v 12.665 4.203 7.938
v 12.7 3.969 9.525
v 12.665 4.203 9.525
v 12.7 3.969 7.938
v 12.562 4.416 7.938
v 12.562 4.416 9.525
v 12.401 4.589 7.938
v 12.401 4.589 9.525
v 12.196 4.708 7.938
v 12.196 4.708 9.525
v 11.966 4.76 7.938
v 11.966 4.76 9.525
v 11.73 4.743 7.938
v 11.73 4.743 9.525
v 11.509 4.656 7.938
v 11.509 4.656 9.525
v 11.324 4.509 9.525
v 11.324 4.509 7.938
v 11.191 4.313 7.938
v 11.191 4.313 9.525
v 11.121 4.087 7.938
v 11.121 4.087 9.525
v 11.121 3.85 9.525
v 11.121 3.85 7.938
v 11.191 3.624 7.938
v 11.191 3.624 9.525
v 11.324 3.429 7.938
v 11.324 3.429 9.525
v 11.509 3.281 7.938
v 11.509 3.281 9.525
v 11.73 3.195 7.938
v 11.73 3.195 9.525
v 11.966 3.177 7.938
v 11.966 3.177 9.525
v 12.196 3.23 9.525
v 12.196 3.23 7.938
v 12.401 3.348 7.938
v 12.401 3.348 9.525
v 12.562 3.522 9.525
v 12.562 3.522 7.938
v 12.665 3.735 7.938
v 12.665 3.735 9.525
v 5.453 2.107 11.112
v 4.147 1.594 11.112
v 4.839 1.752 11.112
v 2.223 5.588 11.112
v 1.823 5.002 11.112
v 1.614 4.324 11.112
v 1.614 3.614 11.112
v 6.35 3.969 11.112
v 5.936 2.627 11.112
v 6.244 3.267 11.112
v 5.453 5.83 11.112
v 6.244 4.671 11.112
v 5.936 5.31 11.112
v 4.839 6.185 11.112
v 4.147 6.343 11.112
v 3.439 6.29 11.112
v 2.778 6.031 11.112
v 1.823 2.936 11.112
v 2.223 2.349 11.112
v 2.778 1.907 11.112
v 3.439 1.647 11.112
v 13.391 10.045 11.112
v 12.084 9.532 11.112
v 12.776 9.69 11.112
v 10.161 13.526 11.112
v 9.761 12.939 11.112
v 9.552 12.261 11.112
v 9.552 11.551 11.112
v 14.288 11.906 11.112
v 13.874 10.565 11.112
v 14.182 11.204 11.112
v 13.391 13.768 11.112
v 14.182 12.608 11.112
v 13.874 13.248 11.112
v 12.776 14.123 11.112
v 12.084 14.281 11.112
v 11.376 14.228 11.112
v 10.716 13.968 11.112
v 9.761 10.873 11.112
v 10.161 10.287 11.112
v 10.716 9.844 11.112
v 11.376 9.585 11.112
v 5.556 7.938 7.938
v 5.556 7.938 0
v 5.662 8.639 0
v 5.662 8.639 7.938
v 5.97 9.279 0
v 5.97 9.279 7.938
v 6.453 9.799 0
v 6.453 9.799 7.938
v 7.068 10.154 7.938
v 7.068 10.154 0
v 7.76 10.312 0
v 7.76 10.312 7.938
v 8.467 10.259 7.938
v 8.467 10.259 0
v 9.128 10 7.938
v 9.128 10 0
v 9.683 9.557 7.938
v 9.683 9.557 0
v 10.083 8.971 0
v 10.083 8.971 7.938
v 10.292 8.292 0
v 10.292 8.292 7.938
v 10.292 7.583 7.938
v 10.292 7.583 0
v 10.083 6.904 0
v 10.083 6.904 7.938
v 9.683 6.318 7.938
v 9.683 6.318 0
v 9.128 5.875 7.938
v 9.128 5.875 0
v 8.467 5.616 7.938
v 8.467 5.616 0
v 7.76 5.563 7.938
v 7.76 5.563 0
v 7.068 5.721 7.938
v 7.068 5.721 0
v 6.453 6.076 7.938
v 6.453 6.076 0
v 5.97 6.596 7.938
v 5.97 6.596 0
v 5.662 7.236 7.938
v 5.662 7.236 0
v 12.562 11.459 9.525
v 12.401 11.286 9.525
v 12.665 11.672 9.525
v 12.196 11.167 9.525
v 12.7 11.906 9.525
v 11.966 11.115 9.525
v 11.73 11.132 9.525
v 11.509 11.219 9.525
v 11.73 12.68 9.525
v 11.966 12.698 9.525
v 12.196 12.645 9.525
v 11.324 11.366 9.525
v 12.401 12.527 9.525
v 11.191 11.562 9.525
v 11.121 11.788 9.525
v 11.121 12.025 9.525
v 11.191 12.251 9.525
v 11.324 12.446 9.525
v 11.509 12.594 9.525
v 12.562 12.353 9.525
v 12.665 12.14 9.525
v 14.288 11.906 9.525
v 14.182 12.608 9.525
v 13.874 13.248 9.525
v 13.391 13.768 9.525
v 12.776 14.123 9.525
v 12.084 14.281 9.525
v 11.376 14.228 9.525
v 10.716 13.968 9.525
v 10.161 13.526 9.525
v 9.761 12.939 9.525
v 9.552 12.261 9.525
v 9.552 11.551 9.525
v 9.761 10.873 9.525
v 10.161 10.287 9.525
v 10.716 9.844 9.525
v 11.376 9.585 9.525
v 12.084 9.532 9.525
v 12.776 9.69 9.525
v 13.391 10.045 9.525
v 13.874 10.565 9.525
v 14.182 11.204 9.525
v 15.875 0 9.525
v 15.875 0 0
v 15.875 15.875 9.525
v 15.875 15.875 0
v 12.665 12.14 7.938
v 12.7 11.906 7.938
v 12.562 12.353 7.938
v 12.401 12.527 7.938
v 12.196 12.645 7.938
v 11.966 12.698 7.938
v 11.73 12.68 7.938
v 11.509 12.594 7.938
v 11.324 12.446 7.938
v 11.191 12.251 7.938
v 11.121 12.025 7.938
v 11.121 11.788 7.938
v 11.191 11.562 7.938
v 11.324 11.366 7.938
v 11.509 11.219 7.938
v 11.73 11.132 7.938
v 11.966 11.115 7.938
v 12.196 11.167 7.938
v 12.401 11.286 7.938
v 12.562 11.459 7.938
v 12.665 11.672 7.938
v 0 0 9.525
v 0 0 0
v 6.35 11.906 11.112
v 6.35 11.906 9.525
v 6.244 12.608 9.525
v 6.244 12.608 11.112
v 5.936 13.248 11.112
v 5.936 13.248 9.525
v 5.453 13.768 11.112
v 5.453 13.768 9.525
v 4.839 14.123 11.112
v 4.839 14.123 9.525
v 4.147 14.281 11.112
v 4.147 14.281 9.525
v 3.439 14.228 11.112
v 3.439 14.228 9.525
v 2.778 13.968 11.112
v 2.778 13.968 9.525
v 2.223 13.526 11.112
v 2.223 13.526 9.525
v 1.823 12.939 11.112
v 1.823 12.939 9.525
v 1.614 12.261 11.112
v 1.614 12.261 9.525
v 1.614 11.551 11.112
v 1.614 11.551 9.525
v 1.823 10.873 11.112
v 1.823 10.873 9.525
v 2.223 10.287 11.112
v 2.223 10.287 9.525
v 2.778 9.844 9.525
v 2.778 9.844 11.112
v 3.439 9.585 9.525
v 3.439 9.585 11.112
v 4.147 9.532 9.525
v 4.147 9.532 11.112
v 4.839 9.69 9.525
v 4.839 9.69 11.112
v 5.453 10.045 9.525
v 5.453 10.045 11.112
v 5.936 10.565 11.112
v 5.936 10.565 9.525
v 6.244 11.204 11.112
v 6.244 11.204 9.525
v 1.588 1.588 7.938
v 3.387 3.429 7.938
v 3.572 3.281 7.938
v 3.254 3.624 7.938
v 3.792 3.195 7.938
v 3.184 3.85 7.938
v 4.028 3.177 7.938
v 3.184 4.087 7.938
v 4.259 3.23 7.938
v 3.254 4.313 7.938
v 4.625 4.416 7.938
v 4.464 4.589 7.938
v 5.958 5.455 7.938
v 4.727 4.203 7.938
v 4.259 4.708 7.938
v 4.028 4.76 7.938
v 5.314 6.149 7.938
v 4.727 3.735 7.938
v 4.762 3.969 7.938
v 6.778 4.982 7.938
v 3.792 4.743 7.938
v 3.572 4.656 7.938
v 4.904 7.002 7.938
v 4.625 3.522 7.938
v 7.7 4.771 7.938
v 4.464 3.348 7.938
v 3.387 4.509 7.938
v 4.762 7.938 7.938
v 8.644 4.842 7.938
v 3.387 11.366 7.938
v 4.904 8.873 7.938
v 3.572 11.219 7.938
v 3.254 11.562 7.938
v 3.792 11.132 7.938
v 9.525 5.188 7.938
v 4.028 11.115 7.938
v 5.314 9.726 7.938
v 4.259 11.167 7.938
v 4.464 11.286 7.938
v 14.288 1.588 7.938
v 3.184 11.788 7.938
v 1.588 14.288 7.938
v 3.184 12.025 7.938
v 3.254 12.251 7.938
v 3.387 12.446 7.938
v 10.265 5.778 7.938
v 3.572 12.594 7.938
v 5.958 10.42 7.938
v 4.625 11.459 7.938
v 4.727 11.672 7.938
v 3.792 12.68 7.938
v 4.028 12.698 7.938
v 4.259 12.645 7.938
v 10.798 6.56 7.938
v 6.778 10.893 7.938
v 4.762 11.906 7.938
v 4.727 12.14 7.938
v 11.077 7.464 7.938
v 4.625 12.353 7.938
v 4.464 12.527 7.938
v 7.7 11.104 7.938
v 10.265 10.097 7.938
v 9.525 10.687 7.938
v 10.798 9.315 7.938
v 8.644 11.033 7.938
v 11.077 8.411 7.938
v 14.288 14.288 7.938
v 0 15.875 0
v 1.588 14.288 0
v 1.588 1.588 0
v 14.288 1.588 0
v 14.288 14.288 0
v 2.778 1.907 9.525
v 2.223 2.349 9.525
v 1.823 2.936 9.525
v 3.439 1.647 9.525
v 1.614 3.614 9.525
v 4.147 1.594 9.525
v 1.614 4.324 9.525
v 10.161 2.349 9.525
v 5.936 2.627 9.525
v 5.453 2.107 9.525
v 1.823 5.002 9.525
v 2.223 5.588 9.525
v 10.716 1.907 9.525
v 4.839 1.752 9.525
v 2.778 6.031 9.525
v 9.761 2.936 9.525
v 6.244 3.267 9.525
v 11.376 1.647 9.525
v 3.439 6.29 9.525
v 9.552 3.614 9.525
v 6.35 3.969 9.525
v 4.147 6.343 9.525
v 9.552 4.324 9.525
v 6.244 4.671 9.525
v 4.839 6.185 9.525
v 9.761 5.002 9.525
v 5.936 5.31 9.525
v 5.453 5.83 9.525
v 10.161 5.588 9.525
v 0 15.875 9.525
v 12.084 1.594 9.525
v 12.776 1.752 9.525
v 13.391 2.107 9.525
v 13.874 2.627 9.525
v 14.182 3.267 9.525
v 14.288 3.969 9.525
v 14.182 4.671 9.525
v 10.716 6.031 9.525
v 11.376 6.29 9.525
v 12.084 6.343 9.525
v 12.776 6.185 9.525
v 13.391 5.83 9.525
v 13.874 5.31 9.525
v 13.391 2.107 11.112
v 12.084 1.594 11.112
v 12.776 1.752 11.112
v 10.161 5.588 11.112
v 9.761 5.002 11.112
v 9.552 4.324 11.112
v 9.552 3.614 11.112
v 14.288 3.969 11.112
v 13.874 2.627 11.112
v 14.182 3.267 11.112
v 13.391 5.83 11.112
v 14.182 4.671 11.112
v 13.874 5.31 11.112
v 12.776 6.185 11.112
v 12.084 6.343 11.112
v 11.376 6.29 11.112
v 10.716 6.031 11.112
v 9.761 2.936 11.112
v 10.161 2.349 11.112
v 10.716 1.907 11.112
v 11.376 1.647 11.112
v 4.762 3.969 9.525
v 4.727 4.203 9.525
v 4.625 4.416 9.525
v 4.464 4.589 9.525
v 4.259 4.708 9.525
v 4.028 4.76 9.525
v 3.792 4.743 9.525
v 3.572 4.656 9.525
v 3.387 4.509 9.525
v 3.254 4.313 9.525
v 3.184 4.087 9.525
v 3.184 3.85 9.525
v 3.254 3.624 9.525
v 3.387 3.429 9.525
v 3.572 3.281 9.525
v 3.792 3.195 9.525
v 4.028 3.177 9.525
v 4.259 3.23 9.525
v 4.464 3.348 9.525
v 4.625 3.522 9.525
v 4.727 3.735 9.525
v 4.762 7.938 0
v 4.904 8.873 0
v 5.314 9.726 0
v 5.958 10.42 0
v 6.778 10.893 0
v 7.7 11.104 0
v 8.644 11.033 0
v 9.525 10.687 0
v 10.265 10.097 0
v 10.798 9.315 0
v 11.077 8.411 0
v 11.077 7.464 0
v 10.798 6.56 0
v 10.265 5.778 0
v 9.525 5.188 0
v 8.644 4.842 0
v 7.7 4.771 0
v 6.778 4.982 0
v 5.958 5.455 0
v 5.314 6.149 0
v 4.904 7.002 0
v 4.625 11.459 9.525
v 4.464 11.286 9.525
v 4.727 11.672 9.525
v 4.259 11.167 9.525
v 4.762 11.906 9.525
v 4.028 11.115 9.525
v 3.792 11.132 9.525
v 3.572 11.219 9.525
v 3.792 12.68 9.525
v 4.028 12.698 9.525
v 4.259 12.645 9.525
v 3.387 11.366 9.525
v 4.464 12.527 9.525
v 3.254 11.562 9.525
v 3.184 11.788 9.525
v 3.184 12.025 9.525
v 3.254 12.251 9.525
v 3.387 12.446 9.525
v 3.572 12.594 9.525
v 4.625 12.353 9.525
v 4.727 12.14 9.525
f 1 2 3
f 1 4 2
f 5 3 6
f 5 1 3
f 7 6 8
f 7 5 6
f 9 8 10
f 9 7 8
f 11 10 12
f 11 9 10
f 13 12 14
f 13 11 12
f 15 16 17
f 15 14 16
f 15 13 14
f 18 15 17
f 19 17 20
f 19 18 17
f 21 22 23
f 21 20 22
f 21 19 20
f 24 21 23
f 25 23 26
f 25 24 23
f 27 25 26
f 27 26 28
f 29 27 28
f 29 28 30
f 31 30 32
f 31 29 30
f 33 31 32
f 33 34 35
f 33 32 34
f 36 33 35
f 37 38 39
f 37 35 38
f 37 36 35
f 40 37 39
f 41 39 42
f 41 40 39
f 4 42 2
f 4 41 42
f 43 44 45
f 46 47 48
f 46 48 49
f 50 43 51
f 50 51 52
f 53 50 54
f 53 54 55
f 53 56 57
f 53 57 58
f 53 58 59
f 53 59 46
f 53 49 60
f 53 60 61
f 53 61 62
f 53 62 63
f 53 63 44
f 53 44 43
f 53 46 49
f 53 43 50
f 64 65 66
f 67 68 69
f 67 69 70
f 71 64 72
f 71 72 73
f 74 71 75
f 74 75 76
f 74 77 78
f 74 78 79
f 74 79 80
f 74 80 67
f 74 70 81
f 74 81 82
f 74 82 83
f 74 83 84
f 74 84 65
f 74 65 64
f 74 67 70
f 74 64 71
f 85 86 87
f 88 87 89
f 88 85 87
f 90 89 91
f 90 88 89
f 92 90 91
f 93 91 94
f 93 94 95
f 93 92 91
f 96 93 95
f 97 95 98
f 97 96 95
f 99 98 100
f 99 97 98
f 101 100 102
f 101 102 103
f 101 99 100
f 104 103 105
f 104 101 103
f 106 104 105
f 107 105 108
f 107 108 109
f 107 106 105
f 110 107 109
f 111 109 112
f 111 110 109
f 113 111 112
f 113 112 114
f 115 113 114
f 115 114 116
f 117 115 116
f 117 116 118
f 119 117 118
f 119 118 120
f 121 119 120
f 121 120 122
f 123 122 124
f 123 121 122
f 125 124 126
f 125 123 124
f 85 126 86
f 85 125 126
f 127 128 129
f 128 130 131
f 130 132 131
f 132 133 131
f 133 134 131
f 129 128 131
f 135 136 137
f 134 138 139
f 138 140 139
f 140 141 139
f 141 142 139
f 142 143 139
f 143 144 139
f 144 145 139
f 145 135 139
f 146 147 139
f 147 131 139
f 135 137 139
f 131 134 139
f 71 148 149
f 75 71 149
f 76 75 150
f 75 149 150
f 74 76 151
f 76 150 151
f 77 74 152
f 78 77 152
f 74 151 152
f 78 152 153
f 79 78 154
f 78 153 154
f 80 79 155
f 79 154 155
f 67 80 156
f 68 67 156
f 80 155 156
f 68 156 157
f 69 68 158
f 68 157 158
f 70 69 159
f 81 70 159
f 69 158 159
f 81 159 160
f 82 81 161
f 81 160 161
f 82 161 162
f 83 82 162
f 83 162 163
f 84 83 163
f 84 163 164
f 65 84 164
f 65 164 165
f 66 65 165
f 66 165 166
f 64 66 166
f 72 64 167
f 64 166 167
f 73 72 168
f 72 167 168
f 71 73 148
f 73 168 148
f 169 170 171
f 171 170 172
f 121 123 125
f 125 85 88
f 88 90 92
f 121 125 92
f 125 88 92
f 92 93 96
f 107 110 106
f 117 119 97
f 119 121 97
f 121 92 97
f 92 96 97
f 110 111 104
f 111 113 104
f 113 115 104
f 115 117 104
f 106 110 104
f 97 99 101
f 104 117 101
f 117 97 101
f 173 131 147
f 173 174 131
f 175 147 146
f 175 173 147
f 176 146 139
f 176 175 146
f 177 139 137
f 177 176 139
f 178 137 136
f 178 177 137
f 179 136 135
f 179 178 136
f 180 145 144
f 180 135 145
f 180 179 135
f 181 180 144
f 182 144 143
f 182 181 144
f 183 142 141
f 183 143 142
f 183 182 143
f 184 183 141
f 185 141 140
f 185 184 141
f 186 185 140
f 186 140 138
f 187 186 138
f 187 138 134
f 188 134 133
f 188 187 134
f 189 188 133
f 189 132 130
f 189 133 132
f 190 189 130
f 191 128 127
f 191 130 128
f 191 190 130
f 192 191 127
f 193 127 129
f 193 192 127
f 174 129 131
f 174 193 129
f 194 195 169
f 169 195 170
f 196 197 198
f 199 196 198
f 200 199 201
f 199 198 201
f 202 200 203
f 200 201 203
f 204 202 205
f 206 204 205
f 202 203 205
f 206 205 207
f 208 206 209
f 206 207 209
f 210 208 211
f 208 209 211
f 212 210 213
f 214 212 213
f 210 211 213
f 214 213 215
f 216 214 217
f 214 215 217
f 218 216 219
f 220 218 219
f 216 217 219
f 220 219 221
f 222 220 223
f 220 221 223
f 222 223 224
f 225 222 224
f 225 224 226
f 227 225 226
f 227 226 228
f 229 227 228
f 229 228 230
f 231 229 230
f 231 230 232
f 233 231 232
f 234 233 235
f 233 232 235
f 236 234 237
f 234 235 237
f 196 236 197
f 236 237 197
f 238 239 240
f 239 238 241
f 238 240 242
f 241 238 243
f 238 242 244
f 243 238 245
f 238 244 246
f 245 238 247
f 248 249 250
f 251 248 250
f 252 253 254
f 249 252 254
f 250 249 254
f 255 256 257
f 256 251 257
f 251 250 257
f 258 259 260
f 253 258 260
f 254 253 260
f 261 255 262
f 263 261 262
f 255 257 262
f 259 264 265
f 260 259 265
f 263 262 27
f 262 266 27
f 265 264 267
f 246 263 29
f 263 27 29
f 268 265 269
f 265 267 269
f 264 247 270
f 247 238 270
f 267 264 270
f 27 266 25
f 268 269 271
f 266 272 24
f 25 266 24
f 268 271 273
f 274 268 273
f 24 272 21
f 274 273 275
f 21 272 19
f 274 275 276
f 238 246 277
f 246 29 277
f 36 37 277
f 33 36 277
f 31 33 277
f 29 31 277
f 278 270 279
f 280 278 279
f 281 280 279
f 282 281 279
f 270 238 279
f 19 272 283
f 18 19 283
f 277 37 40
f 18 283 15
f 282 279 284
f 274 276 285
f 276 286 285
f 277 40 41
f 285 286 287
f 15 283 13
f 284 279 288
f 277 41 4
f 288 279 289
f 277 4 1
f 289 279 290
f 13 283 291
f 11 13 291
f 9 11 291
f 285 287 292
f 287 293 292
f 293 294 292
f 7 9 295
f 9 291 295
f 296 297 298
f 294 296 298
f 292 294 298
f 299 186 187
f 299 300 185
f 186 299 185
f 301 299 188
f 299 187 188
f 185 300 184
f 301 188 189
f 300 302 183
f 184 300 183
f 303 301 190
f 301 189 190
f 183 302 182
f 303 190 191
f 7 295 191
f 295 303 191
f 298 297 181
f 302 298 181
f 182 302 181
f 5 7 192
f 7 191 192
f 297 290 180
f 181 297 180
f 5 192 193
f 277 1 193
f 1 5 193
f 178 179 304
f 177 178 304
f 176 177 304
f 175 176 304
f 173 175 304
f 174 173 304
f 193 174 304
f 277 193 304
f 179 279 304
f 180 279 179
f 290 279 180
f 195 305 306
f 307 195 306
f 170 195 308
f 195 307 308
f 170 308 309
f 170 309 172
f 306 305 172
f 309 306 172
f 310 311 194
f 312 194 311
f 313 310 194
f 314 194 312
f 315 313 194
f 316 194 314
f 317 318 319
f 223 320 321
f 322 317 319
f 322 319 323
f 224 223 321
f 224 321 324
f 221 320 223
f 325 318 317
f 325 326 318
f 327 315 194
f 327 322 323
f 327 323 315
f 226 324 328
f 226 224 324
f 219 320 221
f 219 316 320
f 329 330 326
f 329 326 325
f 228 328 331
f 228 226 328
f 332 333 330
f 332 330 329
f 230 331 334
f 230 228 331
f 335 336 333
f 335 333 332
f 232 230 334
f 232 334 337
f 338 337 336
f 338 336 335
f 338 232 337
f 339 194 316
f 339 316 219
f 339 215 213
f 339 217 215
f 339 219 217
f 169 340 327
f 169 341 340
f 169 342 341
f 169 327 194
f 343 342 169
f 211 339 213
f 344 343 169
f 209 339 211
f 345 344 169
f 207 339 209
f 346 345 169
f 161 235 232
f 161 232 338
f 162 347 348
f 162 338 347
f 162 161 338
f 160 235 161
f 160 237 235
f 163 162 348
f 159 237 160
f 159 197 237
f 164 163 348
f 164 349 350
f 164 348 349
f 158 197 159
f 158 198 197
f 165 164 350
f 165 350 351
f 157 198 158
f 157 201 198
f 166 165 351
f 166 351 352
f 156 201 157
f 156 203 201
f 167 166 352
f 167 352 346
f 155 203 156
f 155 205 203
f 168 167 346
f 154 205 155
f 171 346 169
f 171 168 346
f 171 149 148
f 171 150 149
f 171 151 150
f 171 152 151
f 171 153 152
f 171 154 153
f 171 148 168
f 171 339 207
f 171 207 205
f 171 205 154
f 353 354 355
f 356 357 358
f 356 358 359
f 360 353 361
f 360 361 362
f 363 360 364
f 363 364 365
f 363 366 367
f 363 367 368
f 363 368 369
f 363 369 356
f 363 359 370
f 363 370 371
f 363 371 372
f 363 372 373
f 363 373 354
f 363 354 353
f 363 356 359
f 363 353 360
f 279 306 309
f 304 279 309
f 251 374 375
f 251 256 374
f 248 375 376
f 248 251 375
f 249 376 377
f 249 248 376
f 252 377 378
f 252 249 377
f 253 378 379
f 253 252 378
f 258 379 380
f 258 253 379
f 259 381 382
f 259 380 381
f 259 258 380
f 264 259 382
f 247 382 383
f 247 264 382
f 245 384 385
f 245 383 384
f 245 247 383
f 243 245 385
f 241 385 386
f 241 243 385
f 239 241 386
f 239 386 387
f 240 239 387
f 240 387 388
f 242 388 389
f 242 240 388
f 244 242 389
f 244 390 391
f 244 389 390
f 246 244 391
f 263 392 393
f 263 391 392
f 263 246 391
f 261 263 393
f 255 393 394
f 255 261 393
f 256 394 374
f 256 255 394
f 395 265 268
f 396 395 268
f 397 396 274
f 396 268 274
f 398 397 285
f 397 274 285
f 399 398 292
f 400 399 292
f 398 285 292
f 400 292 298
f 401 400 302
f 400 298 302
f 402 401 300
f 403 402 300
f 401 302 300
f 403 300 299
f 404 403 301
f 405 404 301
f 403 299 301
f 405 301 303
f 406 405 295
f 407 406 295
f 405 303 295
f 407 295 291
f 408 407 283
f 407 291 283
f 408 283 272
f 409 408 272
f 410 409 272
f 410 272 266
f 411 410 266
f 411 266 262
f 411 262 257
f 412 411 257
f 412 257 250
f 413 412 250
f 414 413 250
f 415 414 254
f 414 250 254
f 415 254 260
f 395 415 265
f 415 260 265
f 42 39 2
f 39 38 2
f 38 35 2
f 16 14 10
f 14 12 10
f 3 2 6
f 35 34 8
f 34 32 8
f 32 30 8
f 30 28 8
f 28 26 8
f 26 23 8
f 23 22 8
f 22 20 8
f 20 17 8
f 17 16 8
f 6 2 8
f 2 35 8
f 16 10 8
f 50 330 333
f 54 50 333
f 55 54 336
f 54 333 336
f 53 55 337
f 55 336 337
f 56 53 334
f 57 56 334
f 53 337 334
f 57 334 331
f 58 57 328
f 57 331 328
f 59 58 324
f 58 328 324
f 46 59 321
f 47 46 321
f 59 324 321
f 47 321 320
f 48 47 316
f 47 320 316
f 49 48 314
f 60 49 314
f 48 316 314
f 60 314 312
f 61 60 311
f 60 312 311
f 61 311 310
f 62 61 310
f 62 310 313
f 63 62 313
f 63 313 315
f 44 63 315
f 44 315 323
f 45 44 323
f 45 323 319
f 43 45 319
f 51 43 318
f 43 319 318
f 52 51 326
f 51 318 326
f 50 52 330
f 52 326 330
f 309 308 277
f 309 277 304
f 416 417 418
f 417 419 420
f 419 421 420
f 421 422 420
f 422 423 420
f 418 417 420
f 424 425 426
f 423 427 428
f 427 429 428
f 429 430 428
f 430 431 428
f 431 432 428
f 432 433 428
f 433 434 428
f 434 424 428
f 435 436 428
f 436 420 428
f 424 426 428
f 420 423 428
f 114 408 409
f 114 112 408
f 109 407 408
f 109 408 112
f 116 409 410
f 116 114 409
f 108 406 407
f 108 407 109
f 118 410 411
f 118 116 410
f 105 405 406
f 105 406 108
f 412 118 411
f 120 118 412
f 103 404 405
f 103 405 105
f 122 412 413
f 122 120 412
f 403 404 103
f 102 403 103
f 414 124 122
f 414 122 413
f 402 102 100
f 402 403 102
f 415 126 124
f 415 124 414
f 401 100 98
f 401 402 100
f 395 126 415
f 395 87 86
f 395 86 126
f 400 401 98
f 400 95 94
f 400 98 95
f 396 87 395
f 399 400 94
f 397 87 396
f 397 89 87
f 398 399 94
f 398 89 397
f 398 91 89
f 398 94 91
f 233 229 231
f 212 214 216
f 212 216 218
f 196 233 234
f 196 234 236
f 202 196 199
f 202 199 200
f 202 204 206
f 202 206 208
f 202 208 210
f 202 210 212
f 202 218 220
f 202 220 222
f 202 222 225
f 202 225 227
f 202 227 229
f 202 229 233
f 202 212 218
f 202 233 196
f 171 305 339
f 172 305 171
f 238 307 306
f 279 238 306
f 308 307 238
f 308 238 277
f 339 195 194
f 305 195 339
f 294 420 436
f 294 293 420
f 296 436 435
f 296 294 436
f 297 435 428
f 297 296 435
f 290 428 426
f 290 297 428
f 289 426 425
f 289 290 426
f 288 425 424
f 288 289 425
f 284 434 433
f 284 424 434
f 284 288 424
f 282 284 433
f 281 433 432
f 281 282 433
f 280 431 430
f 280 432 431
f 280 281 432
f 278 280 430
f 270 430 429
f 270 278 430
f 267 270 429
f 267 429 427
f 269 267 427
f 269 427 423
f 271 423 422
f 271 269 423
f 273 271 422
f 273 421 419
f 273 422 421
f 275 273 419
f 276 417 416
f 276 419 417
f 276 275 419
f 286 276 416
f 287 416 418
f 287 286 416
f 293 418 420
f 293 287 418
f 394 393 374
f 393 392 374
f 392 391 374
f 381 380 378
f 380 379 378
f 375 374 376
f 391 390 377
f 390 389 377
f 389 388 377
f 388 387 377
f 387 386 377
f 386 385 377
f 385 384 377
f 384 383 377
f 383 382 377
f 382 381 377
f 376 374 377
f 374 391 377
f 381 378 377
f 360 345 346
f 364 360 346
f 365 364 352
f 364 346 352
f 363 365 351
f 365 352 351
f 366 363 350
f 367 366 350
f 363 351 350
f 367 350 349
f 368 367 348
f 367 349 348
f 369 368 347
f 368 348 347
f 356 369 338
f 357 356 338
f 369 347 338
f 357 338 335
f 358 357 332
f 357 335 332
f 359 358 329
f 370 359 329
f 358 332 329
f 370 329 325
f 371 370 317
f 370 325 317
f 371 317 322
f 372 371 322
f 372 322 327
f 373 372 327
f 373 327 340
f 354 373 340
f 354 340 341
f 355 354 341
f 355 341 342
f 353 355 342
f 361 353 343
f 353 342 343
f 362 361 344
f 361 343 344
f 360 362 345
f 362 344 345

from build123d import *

# Parameters (mm, degrees)
SKETCH1_W            = 15.875
SKETCH1_H            = 15.875
BOSS_EXTRUDE1_DEPTH  = 9.525
SKETCH2_R            = 2.38125
BOSS_EXTRUDE2_DEPTH  = 1.5875
LPATTERN1_COUNT      = 2
LPATTERN1_PITCH      = 7.9375
LPATTERN1_COUNT_DIR2 = 2
LPATTERN1_PITCH_DIR2 = 7.9375
SHELL1_T             = -1.5875
SKETCH3_R            = 3.175
SKETCH3_R_2          = 2.38125
BOSS_EXTRUDE9_DEPTH  = 7.9375


with BuildPart() as part:
    # Sketch1 → Boss-Extrude1 (new body)
    with BuildSketch(Plane.XY):
        with Locations((7.9375, 7.9375)):
            Rectangle(SKETCH1_W, SKETCH1_H)
    extrude(amount=BOSS_EXTRUDE1_DEPTH)

    # Sketch2 → Boss-Extrude2 (add)
    with BuildSketch(Plane.XY.offset(9.525)):
        with Locations((3.96875, 11.90625)):
            Circle(SKETCH2_R)
    boss_extrude2 = extrude(amount=BOSS_EXTRUDE2_DEPTH)

    # LPattern1: Boss-Extrude2 2 × 2
    with Locations(*[(j * LPATTERN1_PITCH_DIR2, -i * LPATTERN1_PITCH, 0) for i in range(LPATTERN1_COUNT) for j in range(LPATTERN1_COUNT_DIR2) if (i, j) != (0, 0)]):
        add(boss_extrude2)

    # Shell1
    shell1_openings = [part.faces().sort_by_distance(p)[0] for p in [
        (7.9375, 7.9375, 0),
    ]]
    offset(amount=SHELL1_T, openings=shell1_openings, kind=Kind.INTERSECTION)

    # Sketch3 → Boss-Extrude9 (add)
    with BuildSketch(Plane(origin=(0, 0, 7.9375), x_dir=(-1, 0, 0), z_dir=(0, 0, -1))):
        with Locations((-7.9375, 7.9375)):
            Circle(SKETCH3_R)
        with Locations((-7.9375, 7.9375)):
            Circle(SKETCH3_R_2, mode=Mode.SUBTRACT)
    extrude(amount=BOSS_EXTRUDE9_DEPTH)


solid = part.part
